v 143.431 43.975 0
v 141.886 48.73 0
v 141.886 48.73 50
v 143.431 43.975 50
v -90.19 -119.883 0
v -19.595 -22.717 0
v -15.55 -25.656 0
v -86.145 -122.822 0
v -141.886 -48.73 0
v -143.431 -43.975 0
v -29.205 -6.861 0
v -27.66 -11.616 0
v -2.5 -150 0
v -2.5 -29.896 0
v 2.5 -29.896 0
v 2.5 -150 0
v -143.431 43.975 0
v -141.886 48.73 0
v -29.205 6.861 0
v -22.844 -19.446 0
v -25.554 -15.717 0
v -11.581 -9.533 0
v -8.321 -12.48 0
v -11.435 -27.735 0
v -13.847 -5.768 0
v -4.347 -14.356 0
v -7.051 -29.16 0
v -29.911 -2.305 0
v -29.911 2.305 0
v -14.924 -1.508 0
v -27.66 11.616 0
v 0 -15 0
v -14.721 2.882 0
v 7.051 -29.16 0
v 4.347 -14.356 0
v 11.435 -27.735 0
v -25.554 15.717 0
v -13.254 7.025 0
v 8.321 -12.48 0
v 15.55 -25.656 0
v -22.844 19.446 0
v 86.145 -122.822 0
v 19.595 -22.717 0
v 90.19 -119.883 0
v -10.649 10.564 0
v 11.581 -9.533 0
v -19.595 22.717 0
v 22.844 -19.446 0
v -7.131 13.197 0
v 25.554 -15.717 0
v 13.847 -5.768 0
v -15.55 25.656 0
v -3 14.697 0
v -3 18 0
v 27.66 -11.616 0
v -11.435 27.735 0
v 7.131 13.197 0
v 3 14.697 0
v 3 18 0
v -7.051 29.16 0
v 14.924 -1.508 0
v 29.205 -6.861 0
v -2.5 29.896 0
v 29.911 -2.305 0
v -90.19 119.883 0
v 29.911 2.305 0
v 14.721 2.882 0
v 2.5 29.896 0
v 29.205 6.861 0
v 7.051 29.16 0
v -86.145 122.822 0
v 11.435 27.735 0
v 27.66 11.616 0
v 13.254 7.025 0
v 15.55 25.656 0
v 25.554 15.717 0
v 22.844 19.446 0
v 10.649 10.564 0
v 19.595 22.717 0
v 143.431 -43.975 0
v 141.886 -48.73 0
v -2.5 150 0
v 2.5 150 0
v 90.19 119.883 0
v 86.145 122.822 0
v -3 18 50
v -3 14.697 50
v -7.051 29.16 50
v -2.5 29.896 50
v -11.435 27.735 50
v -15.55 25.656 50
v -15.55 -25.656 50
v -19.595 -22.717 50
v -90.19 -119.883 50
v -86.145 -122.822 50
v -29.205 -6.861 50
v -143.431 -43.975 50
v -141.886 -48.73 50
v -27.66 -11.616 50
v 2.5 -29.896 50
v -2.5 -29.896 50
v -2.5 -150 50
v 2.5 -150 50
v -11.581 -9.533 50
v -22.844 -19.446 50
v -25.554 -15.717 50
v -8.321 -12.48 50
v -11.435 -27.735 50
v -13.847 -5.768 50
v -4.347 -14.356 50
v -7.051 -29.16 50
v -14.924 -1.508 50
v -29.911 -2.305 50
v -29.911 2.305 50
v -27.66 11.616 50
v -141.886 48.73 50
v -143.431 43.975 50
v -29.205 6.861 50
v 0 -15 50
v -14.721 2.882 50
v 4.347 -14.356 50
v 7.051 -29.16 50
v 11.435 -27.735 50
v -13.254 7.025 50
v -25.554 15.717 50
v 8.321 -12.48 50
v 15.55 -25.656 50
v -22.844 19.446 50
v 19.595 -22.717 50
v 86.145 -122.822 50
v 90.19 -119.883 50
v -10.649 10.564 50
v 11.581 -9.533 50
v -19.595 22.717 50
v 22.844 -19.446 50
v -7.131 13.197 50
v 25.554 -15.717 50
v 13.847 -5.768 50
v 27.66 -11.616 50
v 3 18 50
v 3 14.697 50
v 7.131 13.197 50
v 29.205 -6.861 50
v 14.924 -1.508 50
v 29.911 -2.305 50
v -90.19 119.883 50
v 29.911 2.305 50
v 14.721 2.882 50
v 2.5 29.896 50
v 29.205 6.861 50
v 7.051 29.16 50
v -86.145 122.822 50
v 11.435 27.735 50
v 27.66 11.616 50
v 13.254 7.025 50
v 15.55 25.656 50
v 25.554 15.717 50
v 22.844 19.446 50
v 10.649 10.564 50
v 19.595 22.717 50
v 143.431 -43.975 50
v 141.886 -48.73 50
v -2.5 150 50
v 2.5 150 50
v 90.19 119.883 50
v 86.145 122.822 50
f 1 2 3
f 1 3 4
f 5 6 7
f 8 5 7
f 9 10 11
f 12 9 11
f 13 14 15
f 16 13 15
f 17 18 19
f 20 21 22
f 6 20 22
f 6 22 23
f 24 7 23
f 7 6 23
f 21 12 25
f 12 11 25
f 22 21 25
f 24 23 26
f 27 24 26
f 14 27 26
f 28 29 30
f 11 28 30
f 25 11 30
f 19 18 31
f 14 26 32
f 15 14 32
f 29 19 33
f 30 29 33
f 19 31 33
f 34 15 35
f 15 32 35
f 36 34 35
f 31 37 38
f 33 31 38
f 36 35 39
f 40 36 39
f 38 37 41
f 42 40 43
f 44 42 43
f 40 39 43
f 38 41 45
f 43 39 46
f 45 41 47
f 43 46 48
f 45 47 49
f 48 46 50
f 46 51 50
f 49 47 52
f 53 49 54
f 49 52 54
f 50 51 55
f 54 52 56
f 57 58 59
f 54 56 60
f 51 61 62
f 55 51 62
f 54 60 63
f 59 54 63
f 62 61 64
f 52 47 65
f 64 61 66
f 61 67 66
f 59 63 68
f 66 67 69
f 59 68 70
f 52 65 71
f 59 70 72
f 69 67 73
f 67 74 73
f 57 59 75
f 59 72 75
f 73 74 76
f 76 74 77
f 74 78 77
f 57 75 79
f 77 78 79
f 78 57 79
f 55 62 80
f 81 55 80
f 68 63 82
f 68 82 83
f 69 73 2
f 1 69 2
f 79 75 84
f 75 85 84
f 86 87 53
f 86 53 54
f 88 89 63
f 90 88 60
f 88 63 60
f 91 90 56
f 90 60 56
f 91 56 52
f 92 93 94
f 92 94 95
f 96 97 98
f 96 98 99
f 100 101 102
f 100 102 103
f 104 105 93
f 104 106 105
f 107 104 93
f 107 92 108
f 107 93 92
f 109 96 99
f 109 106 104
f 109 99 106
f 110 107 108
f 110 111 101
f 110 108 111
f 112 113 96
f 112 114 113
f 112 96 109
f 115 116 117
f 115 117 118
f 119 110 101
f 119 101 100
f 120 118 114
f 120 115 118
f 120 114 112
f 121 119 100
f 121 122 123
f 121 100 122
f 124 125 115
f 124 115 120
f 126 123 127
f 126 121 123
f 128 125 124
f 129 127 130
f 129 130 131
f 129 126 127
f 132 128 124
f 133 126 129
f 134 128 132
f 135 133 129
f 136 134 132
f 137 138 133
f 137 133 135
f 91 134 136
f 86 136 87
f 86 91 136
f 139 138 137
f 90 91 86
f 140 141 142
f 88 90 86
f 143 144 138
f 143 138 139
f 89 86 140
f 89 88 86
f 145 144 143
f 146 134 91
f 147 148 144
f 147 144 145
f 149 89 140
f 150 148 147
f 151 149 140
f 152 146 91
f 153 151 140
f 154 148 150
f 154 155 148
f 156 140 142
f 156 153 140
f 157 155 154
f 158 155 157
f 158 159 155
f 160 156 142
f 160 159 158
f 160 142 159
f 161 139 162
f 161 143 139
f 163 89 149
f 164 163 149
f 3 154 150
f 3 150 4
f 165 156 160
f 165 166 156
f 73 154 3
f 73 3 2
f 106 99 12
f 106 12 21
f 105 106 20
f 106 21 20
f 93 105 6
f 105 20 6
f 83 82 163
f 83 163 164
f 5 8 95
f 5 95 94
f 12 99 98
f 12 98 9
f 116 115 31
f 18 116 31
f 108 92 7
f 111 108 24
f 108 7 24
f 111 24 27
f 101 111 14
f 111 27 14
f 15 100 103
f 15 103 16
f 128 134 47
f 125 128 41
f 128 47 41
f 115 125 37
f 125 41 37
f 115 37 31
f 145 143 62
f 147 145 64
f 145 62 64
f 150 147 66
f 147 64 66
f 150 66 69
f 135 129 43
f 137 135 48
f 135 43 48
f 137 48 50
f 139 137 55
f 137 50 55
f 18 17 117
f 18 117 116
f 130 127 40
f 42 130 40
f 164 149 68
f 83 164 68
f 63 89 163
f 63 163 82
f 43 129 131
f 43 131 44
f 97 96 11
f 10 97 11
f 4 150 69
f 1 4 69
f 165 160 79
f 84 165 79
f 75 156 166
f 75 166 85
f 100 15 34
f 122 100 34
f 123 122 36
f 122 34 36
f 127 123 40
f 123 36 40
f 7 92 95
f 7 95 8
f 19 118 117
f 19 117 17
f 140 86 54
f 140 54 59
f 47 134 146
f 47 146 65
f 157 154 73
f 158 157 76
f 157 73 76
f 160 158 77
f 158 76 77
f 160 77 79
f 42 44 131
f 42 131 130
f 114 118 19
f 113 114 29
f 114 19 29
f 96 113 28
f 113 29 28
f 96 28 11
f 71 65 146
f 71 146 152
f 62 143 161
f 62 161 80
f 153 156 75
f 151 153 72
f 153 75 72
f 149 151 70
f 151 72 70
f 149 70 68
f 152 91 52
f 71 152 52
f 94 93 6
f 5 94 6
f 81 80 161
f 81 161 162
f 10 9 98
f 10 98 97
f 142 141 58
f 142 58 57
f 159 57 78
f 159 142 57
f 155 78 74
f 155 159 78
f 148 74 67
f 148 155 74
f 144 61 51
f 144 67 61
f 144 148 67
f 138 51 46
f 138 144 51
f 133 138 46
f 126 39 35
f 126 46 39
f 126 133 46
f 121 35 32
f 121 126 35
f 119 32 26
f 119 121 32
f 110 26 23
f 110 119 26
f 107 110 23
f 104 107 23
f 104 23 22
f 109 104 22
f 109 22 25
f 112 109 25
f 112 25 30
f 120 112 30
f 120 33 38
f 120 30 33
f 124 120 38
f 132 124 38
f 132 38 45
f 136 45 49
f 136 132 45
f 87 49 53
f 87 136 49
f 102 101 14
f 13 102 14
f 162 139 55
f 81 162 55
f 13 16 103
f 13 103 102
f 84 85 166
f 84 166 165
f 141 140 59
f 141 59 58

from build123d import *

# Parameters (mm, degrees)
SKETCH_1_R               = 30
EXTRUDE_1_DEPTH          = 50
CUT_EXTRUDE_1_DEPTH      = 66.574385243
EXTRUDE_2_REACH          = 191.209
EXTRUDE_2_END_RADIUS     = 30
SKETCH_3_W               = 5
SKETCH_3_H               = 50
PATTERN_CIRCULAR_1_COUNT = 10


with BuildPart() as part:
    # 草图1 → 凸台-拉伸1 (new body)
    with BuildSketch(Plane.XY):
        Circle(SKETCH_1_R)
    extrude(amount=EXTRUDE_1_DEPTH)

    # 草图2 → 切除-拉伸1 (cut, through all)
    with BuildSketch(Plane.XY.offset(50)):
        with BuildLine():
            Line((-3, 18), (3, 18))
            Line((3, 18), (3, 14.696938457))
            ThreePointArc((3, 14.696938457), (0, -15), (-3, 14.696938457))
            Line((-3, 14.696938457), (-3, 18))
        make_face()
    extrude(amount=-CUT_EXTRUDE_1_DEPTH, mode=Mode.SUBTRACT)

    # 凸台-拉伸2: up to this cylinder (the profile starts outside it)
    extrude_2_end = Plane(origin=(0, 0, 25), z_dir=(0, 0, -1)) * Cylinder(EXTRUDE_2_END_RADIUS, 443.418, mode=Mode.PRIVATE)
    # 草图3 → 凸台-拉伸2 (add, up to the surface)
    with BuildSketch(Plane(origin=(0, 150, 0), x_dir=(1, 0, 0), z_dir=(0, 1, 0)), mode=Mode.PRIVATE) as extrude_2_sk1:
        with Locations((0, -25)):
            Rectangle(SKETCH_3_W, SKETCH_3_H)
    extrude_2_tool1 = extrude(extrude_2_sk1.sketch, amount=-EXTRUDE_2_REACH, mode=Mode.PRIVATE) - extrude_2_end
    extrude_2 = extrude_2_tool1.solids().sort_by_distance((0, 150, 25))[0]
    add(extrude_2)

    # 阵列(圆周)1: 凸台-拉伸2 ×10 about axis
    pattern_circular_1_axis = Axis((0, 0, 0), (0, 0, 1))
    for i in range(1, PATTERN_CIRCULAR_1_COUNT):
        add(extrude_2.rotate(pattern_circular_1_axis, i * 360 / PATTERN_CIRCULAR_1_COUNT))


solid = part.part
